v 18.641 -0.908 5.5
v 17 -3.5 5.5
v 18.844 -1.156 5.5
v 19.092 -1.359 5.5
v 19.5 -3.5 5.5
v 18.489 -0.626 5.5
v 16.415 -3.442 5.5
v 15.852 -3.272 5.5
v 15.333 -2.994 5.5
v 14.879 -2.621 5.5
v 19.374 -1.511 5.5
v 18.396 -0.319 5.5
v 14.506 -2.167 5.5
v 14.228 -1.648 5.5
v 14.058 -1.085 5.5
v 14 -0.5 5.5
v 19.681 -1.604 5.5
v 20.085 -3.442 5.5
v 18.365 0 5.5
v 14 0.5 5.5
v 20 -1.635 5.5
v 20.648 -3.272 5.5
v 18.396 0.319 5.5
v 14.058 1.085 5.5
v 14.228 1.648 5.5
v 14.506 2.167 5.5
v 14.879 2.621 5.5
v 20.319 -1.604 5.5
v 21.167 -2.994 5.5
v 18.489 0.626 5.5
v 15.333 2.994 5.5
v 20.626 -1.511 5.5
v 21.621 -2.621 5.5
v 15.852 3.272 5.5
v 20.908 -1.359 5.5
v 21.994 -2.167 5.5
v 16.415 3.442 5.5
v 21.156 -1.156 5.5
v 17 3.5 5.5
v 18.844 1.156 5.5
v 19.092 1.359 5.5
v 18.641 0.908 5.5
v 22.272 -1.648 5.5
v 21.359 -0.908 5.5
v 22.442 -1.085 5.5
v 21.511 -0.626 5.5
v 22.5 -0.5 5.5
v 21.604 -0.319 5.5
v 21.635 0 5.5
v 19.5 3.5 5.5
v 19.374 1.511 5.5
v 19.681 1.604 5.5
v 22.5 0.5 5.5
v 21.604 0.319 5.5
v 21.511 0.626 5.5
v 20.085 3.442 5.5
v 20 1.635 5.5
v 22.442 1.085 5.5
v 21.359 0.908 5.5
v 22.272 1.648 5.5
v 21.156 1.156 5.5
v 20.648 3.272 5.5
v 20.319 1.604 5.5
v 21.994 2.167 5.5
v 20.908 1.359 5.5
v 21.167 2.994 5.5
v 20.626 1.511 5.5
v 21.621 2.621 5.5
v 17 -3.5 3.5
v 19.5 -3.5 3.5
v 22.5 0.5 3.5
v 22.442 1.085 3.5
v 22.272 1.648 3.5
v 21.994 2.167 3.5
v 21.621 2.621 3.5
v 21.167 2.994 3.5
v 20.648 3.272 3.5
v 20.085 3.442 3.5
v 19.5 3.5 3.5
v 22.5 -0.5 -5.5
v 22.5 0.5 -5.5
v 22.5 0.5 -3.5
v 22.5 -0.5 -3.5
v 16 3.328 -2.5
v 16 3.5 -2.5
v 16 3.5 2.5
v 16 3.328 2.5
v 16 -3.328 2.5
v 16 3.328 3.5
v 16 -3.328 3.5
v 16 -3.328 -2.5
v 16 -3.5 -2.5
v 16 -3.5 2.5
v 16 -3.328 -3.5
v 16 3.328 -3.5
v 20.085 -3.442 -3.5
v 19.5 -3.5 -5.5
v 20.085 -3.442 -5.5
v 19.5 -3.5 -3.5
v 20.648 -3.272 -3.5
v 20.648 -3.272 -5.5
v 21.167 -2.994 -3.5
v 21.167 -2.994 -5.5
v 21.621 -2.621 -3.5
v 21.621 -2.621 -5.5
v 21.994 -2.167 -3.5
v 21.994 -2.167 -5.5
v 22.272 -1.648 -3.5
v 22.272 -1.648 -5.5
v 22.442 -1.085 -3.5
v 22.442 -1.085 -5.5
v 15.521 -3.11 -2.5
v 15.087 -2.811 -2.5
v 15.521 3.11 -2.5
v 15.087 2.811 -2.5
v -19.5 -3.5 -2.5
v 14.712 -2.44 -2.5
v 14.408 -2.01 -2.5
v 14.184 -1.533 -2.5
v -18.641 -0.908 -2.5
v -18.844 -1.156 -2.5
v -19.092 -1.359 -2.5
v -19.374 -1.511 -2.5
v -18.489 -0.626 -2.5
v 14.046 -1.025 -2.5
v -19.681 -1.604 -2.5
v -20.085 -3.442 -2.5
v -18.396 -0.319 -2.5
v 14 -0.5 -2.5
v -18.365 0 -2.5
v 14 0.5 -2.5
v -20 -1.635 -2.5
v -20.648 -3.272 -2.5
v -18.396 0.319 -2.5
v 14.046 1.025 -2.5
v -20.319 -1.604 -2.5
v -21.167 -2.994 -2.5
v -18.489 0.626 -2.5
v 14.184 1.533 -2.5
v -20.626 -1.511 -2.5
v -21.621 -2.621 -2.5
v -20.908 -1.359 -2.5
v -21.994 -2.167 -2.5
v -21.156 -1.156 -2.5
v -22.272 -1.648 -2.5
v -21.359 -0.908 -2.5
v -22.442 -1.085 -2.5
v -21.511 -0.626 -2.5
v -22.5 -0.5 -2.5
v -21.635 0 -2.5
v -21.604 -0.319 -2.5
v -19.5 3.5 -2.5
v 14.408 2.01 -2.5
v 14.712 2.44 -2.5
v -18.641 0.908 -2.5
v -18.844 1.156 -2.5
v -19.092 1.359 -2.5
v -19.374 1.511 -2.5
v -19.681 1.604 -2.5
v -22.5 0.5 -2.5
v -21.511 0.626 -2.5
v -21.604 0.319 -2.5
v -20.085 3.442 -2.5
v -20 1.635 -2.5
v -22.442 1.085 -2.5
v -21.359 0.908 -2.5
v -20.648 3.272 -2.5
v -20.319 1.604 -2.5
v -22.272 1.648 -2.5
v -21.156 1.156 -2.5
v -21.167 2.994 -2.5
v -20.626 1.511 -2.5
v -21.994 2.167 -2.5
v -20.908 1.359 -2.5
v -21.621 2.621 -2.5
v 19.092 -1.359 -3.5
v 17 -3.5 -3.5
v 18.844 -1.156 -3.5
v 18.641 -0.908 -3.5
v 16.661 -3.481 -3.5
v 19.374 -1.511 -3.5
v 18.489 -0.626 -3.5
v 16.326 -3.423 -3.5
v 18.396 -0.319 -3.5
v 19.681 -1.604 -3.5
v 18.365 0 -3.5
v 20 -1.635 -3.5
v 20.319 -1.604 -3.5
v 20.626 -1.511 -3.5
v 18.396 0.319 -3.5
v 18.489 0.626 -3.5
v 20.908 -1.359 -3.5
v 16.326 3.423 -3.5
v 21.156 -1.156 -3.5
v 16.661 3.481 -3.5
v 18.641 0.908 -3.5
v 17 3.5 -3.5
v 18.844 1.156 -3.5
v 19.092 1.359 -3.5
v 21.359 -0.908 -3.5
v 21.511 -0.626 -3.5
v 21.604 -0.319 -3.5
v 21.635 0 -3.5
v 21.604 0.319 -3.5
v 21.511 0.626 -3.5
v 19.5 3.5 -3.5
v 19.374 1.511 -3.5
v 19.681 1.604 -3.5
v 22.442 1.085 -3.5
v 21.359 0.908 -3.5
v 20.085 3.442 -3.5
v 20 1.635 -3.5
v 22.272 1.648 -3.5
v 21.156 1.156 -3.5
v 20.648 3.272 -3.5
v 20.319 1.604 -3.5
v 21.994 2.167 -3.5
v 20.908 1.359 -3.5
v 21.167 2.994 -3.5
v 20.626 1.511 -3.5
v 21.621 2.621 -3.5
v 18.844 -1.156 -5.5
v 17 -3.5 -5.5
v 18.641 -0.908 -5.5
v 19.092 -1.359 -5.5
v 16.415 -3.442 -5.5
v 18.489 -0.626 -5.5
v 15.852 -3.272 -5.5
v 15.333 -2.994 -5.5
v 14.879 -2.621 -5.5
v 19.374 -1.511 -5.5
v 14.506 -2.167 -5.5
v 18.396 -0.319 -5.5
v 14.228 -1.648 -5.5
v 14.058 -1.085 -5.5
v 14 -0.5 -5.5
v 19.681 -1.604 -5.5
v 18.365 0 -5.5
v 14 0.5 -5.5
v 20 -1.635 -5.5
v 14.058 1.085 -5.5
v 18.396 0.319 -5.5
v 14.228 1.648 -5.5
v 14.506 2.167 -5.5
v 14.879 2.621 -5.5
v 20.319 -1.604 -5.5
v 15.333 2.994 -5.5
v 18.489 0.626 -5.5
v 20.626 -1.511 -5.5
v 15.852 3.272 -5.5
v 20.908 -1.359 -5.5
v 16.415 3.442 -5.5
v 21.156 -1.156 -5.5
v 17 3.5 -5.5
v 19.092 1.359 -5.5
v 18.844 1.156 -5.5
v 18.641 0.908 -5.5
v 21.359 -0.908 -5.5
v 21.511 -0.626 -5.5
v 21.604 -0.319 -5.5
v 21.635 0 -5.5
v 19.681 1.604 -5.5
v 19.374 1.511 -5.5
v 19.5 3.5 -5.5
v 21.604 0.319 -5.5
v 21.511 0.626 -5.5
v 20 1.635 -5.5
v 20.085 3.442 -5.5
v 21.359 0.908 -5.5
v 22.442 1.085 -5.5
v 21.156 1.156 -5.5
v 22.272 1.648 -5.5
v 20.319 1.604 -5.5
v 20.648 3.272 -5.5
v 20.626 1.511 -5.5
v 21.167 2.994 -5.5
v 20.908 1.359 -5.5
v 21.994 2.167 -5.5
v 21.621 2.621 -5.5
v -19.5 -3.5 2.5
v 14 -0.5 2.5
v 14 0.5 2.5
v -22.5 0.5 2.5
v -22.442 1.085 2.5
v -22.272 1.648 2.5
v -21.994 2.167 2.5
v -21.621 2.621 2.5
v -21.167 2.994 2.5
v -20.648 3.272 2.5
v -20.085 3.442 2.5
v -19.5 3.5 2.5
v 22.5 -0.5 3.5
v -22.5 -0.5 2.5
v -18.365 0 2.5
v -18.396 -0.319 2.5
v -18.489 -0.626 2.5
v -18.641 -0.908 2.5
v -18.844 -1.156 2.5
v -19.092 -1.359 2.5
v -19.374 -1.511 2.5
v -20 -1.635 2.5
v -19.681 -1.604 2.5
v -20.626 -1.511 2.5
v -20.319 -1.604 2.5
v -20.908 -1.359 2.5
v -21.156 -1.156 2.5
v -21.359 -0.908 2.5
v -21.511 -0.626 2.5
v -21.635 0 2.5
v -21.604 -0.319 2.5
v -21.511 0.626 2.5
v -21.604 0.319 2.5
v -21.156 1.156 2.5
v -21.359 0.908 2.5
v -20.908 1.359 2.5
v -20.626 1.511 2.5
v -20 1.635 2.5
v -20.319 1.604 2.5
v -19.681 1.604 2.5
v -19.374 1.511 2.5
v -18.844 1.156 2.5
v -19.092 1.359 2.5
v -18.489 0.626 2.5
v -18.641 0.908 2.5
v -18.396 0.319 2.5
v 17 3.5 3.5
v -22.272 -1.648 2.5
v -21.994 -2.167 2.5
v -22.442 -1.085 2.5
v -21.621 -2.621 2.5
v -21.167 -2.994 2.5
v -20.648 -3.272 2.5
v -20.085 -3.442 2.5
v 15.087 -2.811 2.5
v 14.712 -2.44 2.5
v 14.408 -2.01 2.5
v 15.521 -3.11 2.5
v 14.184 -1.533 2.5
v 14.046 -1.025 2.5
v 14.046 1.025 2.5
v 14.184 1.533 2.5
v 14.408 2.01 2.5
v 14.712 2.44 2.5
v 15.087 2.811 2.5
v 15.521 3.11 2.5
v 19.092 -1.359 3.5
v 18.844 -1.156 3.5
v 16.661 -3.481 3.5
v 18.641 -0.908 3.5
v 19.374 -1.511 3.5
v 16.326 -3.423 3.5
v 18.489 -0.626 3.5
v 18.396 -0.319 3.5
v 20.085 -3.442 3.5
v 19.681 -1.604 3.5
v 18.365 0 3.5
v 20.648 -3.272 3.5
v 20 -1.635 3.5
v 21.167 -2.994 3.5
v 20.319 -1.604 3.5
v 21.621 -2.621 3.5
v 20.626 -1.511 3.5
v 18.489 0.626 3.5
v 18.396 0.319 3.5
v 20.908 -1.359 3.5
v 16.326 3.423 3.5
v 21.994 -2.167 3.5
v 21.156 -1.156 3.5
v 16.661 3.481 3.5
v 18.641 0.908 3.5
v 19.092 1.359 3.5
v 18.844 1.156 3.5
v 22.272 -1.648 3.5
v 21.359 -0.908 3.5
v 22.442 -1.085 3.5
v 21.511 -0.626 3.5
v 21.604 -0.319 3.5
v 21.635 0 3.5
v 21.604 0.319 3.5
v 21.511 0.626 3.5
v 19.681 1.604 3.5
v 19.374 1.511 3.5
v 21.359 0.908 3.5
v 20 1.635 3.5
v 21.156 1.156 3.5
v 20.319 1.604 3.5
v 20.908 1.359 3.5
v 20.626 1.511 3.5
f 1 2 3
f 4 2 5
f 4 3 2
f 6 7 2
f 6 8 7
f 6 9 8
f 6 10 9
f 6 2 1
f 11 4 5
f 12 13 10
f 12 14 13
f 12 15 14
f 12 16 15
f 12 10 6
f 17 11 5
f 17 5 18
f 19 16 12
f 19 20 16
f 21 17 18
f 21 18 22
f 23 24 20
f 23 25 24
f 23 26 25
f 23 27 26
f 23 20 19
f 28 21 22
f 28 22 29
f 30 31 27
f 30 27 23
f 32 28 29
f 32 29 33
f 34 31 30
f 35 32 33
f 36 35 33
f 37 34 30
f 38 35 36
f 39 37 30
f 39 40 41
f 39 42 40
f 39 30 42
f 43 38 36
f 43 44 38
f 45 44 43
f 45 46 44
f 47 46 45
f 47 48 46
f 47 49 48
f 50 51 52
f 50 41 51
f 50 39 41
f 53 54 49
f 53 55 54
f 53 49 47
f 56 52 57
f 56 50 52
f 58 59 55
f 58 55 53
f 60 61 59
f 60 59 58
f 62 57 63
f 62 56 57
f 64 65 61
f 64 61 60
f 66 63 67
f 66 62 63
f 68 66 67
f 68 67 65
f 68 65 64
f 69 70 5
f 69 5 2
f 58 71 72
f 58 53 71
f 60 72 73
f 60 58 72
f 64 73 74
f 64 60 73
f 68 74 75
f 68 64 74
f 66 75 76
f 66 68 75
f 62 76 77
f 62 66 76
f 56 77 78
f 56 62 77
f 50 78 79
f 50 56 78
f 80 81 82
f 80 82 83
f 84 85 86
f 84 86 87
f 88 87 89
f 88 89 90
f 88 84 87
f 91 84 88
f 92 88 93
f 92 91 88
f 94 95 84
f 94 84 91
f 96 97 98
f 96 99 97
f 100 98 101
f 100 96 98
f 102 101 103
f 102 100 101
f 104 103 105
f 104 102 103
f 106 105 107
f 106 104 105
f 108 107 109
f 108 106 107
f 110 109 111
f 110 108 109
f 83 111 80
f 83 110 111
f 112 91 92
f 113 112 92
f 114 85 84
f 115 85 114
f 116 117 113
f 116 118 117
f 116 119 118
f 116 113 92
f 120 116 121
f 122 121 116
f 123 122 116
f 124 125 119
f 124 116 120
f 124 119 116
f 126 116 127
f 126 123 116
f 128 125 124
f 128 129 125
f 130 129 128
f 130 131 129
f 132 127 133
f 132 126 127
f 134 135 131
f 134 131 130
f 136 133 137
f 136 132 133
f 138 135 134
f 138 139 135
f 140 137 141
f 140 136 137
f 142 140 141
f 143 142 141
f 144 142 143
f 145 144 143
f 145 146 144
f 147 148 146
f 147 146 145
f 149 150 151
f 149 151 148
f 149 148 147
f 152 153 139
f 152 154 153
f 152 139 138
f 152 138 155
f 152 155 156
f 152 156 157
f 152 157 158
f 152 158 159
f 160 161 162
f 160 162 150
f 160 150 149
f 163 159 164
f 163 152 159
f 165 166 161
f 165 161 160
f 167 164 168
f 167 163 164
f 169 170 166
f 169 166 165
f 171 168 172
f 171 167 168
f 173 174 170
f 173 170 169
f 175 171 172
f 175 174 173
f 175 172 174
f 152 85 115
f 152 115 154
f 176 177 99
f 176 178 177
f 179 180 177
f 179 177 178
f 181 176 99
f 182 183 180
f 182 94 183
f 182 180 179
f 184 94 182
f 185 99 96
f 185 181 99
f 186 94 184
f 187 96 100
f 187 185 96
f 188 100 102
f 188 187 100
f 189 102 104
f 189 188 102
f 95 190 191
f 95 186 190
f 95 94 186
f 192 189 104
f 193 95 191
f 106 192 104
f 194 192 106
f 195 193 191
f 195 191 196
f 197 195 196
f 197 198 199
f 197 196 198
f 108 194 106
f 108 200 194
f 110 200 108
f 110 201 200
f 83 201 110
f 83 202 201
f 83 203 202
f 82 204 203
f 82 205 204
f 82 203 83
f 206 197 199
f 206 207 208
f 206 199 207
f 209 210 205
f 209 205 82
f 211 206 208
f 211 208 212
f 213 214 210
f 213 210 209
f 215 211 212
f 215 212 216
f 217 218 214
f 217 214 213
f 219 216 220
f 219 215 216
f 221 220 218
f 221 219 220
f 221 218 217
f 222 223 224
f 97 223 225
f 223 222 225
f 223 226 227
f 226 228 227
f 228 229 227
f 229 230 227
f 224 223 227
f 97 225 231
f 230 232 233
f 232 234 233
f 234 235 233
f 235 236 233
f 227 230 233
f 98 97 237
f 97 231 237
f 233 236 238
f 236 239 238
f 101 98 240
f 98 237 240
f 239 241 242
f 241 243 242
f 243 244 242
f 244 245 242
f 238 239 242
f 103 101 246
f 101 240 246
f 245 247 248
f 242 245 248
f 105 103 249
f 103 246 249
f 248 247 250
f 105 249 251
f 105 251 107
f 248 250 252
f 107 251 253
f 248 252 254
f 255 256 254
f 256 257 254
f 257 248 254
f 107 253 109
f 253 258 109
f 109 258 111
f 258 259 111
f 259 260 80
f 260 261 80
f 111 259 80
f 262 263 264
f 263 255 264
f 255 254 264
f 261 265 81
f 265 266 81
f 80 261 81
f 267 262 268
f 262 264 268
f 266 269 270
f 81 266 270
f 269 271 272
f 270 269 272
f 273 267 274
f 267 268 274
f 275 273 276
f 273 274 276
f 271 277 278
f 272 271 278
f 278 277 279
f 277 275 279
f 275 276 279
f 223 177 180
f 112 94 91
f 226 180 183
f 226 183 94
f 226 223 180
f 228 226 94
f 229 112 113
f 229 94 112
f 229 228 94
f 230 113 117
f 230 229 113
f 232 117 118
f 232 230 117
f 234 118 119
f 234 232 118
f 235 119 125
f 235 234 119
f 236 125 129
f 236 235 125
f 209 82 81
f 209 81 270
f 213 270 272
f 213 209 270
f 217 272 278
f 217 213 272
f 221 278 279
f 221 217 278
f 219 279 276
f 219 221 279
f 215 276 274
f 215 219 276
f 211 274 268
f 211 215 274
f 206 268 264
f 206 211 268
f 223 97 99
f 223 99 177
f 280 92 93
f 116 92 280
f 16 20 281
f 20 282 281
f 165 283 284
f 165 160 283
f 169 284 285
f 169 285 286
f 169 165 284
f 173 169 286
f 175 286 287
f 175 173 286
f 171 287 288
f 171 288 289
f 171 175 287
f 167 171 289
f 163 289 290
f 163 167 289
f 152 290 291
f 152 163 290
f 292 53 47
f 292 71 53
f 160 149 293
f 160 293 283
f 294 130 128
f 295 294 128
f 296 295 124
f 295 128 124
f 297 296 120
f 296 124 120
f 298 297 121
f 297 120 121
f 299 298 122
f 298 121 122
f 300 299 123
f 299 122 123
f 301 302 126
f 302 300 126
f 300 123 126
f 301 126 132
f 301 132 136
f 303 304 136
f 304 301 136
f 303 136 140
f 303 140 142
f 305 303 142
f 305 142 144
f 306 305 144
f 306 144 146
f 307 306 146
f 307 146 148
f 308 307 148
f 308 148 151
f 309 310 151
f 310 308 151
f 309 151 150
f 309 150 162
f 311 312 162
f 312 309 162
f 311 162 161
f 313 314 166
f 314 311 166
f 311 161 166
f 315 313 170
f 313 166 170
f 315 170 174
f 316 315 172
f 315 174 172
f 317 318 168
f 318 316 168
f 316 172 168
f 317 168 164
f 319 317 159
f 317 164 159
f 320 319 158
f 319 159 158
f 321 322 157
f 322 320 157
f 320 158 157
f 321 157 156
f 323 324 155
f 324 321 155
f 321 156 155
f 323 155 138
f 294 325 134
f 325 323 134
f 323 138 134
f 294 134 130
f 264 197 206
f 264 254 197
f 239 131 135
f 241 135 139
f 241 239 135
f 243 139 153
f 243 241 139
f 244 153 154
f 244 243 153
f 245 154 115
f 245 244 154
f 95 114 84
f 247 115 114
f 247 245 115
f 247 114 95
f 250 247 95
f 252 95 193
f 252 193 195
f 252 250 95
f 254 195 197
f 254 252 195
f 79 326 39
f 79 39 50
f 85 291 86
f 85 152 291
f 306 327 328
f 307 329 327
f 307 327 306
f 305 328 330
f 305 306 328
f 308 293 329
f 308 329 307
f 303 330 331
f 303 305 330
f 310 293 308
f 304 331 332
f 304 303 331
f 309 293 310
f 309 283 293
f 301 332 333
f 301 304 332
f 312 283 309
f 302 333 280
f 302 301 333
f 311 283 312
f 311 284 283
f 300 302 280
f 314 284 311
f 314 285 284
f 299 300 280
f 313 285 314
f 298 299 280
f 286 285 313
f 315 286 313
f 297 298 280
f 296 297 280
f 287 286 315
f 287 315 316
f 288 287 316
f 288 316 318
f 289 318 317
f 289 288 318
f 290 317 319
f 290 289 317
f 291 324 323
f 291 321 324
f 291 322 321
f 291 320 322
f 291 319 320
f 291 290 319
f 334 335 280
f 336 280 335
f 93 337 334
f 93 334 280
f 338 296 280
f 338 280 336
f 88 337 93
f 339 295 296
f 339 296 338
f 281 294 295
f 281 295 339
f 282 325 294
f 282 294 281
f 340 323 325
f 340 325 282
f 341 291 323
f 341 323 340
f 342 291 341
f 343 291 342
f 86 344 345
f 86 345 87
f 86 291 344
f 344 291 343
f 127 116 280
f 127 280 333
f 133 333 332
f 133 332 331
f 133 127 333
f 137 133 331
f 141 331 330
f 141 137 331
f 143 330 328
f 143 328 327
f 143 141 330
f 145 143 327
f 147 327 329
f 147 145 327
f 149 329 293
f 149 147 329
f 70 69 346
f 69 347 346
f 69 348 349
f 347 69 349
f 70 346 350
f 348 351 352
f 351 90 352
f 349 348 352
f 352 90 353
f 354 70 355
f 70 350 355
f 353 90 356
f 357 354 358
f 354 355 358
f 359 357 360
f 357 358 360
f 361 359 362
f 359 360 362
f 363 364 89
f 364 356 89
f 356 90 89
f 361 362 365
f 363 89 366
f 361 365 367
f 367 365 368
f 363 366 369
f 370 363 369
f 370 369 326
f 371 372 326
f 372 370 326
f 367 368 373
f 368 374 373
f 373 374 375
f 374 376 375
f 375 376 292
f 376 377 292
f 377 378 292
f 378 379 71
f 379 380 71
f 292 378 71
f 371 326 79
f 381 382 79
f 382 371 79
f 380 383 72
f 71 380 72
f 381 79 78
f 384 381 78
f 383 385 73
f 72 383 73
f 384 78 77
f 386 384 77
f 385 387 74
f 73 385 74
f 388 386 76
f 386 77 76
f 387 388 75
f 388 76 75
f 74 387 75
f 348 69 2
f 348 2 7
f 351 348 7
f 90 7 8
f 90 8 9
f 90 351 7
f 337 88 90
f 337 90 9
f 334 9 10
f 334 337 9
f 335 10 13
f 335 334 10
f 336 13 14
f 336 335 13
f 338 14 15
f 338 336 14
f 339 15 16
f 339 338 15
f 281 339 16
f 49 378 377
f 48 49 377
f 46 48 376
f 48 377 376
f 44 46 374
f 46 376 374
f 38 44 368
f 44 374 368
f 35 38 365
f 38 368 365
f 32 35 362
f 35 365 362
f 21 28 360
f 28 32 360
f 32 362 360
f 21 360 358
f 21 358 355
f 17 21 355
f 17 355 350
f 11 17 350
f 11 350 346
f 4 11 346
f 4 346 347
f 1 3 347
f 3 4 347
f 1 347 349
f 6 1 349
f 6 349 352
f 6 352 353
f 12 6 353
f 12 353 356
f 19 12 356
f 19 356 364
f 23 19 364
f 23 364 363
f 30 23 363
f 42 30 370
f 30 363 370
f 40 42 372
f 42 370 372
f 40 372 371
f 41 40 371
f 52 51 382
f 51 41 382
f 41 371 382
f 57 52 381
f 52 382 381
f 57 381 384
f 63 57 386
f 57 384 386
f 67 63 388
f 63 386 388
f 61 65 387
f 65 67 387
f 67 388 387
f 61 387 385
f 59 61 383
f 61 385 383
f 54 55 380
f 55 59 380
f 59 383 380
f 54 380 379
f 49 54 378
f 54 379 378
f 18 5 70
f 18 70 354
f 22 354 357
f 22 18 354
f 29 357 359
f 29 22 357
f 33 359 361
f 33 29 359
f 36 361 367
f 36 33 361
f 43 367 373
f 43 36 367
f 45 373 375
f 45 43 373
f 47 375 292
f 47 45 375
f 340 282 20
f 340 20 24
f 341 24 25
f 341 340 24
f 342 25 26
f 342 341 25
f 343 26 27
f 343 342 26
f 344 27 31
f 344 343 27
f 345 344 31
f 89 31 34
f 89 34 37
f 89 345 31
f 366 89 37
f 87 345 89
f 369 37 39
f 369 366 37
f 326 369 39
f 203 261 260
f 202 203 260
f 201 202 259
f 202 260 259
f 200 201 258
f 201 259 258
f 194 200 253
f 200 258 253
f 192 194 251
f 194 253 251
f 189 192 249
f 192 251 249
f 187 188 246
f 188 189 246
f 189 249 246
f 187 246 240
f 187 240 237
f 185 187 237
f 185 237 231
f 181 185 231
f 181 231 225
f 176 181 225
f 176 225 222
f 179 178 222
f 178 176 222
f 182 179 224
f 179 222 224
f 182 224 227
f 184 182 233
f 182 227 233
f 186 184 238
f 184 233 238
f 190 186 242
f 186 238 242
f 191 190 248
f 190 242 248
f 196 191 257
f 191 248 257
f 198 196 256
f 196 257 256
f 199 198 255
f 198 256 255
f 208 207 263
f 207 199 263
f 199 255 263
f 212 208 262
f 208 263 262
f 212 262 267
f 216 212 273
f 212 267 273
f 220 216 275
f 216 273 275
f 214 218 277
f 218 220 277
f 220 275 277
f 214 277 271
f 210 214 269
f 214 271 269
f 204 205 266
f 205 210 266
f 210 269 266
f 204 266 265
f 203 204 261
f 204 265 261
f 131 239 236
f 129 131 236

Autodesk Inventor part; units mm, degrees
ref_plane "YZ Plane" through (0, 0, 0) normal (1, 0, 0) x (0, 1, 0)
ref_plane "XZ Plane" through (0, 0, 0) normal (0, 1, 0) x (-1, 0, 0)
ref_plane "XY Plane" through (0, 0, 0) normal (0, 0, 1) x (1, 0, 0)
sketch "スケッチ1" plane through (0, 0, 0) normal (0, 0, 1) x (1, 0, 0)
  line L0 (-22.5, 3.5) -> (22.5, 3.5)
  line L1 (22.5, 3.5) -> (22.5, -3.5)
  line L2 (22.5, -3.5) -> (-22.5, -3.5)
  line L3 (-22.5, -3.5) -> (-22.5, 3.5)
  line L4 (-22.5, 3.5) -> (22.5, -3.5) construction
  line L5 (22.5, 3.5) -> (-22.5, -3.5) construction
  line L6 (0, -6.37) -> (0, 6.37) construction
  line L7 (-34.37, 0) -> (34.37, 0) construction
  circle A0 centre (-20, 0) radius 4.55
  line L8 (22.5, -3.5) -> (22.5, 3.5)
  circle A1 centre (20, 0) radius 4.55
  circle A2 centre (-20, 0) radius 1.635
  circle A3 centre (20, 0) radius 1.635
  line L9 (14, 3.5) -> (14, -3.5)
  line L10 (16, 3.5) -> (16, -3.5)
  point P0 (0, 0)
  point P1 (-17.0927, 3.5)
  point P2 (-22.9073, 3.5)
  point P3 (-22.9073, -3.5)
  point P4 (-17.0927, -3.5)
  point P5 (17.0927, 3.5)
  point P6 (17.0927, -3.5)
  point P7 (22.9073, -3.5)
  point P8 (22.9073, 3.5)
  dimension "d1" = 7
  dimension "d2" = 20
  dimension "d3" = 45
  dimension "d4" = 9.1
  dimension "d12" = 3.27
  dimension "d13" = 3.27
  dimension "d14" = 6
  dimension "d15" = 2
extrude "押し出し1" add sketch "スケッチ1" along normal mid plane 5 contours L9 L2 A0 L0 | L0 L10 A1 L2 L9 | L0 A1 L10 | A0 L2 L3 L0 | L0 L1 L2 A1 L10 | L10 A1 | L10 A1 L2 picked at (-19.7985, 2.8744)
fillet "フィレット1" radius 3 4 edges at (-22.5, 3.5, 0) (-22.5, -3.5, 0) (22.5, -3.5, 0) (22.5, 3.5, 0)
extrude "押し出し3" add sketch "スケッチ1" along normal mid plane 11 contours L0 L10 A1 L2 L9 | L0 A1 L10 | L0 L1 L2 A1 L10 | L10 A1 | L10 A1 L2
extrude "押し出し4" cut sketch "スケッチ1" along normal mid plane 7 contours L0 A1 L10 | L0 L1 L2 A1 L10 | L10 A1 L2
fillet "フィレット2" radius 3 8 edges at (22.5, 3.5, 4.5) (22.5, -3.5, 4.5) (22.5, 3.5, -4.5) (22.5, -3.5, -4.5) (14, 3.5, 4) (14, -3.5, 4) (14, 3.5, -4) (14, -3.5, -4)
properties part number "link_arm_1"
